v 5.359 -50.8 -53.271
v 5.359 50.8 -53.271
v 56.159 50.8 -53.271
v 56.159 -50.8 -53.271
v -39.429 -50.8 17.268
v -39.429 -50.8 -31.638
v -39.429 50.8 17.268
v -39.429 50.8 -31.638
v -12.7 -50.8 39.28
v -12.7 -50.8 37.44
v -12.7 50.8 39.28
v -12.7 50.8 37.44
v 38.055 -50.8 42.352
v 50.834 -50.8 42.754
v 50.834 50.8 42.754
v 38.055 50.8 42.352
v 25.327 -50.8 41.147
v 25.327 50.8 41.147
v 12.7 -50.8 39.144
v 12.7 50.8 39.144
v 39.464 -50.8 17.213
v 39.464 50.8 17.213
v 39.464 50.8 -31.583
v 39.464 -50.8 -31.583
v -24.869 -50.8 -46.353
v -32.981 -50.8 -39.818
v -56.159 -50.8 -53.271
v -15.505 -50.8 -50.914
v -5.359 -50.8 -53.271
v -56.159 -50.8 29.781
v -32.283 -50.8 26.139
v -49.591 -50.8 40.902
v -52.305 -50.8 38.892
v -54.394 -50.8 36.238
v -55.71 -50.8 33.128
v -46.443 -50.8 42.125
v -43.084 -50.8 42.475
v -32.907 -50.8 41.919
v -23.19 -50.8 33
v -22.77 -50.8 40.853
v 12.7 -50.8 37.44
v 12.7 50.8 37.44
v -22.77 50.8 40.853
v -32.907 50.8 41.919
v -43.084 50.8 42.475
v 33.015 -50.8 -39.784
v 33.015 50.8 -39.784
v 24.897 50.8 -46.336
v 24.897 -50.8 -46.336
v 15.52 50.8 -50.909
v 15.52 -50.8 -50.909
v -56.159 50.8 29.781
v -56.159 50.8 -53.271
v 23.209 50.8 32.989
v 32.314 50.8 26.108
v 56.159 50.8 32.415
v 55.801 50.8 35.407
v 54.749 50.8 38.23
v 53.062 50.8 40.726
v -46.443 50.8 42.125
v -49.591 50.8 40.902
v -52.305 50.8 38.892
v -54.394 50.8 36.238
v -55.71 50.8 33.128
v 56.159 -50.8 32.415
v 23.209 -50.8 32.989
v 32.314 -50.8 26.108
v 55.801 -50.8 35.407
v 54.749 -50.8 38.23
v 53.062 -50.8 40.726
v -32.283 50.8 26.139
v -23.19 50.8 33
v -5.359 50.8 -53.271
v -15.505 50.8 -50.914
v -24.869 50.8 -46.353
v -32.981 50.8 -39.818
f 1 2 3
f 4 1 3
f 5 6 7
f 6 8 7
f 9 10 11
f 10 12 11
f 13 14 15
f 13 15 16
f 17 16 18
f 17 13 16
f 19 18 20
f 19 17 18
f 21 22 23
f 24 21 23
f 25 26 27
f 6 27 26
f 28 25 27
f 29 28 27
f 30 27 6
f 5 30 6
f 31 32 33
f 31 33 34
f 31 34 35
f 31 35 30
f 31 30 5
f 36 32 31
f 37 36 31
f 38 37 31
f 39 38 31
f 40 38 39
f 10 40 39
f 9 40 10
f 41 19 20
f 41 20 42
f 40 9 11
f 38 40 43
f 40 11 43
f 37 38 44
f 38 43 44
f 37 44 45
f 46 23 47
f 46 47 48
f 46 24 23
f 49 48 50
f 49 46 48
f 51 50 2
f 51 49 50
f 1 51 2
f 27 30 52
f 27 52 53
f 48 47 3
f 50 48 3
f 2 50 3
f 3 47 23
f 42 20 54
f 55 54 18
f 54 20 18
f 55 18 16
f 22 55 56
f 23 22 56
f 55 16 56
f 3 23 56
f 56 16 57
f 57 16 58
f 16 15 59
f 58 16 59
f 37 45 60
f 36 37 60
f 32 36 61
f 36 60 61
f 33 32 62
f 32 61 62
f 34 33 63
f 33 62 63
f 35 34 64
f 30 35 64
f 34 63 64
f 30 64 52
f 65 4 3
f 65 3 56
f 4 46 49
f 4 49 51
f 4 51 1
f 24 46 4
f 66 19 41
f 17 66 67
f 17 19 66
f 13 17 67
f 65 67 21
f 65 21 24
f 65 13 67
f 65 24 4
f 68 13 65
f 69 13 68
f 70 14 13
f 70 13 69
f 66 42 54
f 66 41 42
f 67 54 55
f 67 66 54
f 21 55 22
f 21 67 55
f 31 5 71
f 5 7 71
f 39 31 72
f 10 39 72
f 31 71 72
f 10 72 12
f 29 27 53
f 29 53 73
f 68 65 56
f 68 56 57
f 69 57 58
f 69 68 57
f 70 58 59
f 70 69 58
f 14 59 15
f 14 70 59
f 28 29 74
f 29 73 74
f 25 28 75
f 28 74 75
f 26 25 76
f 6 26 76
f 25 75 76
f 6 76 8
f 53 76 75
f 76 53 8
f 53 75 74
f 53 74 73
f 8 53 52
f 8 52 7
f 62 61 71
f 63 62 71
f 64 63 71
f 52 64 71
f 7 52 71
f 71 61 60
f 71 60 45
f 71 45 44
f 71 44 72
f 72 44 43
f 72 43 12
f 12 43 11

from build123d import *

# Parameters (mm, degrees)
F1_DEPTH = 50.8


with BuildPart() as f1:
    # F0 (on Front) → F1 (new body, symmetric)
    with BuildSketch(Plane.XZ):
        with BuildLine():
            Line((-56.158637, 29.78059), (-56.158637, -53.271118))
            Line((-56.158637, -53.271118), (-5.358637, -53.271118))
            ThreePointArc((-5.358637, -53.271118), (-24.869351, -46.353357), (-39.429359, -31.638414))
            Line((-39.429359, -31.638414), (-39.429359, 17.268347))
            ThreePointArc((-39.429359, 17.268347), (-27.947929, 29.849483), (-12.7, 37.439535))
            Line((-12.7, 37.439535), (-12.7, 39.280263))
            ThreePointArc((-12.7, 39.280263), (-27.831789, 41.4495), (-43.083833, 42.475058))
            ThreePointArc((-43.083833, 42.475058), (-52.305388, 38.892396), (-56.158637, 29.78059))
        make_face()
        with BuildLine():
            ThreePointArc((39.463547, -31.583202), (24.896756, -46.335943), (5.358637, -53.271118))
            Line((5.358637, -53.271118), (56.158637, -53.271118))
            Line((56.158637, -53.271118), (56.158637, 32.415154))
            ThreePointArc((56.158637, 32.415154), (54.749163, 38.230137), (50.833595, 42.7544))
            ThreePointArc((50.833595, 42.7544), (31.681539, 41.849824), (12.7, 39.144151))
            Line((12.7, 39.144151), (12.7, 37.439535))
            ThreePointArc((12.7, 37.439535), (27.97384, 29.829915), (39.463547, 17.213135))
            Line((39.463547, 17.213135), (39.463547, -31.583202))
        make_face()
    extrude(amount=F1_DEPTH, both=True)


solid = f1.part
